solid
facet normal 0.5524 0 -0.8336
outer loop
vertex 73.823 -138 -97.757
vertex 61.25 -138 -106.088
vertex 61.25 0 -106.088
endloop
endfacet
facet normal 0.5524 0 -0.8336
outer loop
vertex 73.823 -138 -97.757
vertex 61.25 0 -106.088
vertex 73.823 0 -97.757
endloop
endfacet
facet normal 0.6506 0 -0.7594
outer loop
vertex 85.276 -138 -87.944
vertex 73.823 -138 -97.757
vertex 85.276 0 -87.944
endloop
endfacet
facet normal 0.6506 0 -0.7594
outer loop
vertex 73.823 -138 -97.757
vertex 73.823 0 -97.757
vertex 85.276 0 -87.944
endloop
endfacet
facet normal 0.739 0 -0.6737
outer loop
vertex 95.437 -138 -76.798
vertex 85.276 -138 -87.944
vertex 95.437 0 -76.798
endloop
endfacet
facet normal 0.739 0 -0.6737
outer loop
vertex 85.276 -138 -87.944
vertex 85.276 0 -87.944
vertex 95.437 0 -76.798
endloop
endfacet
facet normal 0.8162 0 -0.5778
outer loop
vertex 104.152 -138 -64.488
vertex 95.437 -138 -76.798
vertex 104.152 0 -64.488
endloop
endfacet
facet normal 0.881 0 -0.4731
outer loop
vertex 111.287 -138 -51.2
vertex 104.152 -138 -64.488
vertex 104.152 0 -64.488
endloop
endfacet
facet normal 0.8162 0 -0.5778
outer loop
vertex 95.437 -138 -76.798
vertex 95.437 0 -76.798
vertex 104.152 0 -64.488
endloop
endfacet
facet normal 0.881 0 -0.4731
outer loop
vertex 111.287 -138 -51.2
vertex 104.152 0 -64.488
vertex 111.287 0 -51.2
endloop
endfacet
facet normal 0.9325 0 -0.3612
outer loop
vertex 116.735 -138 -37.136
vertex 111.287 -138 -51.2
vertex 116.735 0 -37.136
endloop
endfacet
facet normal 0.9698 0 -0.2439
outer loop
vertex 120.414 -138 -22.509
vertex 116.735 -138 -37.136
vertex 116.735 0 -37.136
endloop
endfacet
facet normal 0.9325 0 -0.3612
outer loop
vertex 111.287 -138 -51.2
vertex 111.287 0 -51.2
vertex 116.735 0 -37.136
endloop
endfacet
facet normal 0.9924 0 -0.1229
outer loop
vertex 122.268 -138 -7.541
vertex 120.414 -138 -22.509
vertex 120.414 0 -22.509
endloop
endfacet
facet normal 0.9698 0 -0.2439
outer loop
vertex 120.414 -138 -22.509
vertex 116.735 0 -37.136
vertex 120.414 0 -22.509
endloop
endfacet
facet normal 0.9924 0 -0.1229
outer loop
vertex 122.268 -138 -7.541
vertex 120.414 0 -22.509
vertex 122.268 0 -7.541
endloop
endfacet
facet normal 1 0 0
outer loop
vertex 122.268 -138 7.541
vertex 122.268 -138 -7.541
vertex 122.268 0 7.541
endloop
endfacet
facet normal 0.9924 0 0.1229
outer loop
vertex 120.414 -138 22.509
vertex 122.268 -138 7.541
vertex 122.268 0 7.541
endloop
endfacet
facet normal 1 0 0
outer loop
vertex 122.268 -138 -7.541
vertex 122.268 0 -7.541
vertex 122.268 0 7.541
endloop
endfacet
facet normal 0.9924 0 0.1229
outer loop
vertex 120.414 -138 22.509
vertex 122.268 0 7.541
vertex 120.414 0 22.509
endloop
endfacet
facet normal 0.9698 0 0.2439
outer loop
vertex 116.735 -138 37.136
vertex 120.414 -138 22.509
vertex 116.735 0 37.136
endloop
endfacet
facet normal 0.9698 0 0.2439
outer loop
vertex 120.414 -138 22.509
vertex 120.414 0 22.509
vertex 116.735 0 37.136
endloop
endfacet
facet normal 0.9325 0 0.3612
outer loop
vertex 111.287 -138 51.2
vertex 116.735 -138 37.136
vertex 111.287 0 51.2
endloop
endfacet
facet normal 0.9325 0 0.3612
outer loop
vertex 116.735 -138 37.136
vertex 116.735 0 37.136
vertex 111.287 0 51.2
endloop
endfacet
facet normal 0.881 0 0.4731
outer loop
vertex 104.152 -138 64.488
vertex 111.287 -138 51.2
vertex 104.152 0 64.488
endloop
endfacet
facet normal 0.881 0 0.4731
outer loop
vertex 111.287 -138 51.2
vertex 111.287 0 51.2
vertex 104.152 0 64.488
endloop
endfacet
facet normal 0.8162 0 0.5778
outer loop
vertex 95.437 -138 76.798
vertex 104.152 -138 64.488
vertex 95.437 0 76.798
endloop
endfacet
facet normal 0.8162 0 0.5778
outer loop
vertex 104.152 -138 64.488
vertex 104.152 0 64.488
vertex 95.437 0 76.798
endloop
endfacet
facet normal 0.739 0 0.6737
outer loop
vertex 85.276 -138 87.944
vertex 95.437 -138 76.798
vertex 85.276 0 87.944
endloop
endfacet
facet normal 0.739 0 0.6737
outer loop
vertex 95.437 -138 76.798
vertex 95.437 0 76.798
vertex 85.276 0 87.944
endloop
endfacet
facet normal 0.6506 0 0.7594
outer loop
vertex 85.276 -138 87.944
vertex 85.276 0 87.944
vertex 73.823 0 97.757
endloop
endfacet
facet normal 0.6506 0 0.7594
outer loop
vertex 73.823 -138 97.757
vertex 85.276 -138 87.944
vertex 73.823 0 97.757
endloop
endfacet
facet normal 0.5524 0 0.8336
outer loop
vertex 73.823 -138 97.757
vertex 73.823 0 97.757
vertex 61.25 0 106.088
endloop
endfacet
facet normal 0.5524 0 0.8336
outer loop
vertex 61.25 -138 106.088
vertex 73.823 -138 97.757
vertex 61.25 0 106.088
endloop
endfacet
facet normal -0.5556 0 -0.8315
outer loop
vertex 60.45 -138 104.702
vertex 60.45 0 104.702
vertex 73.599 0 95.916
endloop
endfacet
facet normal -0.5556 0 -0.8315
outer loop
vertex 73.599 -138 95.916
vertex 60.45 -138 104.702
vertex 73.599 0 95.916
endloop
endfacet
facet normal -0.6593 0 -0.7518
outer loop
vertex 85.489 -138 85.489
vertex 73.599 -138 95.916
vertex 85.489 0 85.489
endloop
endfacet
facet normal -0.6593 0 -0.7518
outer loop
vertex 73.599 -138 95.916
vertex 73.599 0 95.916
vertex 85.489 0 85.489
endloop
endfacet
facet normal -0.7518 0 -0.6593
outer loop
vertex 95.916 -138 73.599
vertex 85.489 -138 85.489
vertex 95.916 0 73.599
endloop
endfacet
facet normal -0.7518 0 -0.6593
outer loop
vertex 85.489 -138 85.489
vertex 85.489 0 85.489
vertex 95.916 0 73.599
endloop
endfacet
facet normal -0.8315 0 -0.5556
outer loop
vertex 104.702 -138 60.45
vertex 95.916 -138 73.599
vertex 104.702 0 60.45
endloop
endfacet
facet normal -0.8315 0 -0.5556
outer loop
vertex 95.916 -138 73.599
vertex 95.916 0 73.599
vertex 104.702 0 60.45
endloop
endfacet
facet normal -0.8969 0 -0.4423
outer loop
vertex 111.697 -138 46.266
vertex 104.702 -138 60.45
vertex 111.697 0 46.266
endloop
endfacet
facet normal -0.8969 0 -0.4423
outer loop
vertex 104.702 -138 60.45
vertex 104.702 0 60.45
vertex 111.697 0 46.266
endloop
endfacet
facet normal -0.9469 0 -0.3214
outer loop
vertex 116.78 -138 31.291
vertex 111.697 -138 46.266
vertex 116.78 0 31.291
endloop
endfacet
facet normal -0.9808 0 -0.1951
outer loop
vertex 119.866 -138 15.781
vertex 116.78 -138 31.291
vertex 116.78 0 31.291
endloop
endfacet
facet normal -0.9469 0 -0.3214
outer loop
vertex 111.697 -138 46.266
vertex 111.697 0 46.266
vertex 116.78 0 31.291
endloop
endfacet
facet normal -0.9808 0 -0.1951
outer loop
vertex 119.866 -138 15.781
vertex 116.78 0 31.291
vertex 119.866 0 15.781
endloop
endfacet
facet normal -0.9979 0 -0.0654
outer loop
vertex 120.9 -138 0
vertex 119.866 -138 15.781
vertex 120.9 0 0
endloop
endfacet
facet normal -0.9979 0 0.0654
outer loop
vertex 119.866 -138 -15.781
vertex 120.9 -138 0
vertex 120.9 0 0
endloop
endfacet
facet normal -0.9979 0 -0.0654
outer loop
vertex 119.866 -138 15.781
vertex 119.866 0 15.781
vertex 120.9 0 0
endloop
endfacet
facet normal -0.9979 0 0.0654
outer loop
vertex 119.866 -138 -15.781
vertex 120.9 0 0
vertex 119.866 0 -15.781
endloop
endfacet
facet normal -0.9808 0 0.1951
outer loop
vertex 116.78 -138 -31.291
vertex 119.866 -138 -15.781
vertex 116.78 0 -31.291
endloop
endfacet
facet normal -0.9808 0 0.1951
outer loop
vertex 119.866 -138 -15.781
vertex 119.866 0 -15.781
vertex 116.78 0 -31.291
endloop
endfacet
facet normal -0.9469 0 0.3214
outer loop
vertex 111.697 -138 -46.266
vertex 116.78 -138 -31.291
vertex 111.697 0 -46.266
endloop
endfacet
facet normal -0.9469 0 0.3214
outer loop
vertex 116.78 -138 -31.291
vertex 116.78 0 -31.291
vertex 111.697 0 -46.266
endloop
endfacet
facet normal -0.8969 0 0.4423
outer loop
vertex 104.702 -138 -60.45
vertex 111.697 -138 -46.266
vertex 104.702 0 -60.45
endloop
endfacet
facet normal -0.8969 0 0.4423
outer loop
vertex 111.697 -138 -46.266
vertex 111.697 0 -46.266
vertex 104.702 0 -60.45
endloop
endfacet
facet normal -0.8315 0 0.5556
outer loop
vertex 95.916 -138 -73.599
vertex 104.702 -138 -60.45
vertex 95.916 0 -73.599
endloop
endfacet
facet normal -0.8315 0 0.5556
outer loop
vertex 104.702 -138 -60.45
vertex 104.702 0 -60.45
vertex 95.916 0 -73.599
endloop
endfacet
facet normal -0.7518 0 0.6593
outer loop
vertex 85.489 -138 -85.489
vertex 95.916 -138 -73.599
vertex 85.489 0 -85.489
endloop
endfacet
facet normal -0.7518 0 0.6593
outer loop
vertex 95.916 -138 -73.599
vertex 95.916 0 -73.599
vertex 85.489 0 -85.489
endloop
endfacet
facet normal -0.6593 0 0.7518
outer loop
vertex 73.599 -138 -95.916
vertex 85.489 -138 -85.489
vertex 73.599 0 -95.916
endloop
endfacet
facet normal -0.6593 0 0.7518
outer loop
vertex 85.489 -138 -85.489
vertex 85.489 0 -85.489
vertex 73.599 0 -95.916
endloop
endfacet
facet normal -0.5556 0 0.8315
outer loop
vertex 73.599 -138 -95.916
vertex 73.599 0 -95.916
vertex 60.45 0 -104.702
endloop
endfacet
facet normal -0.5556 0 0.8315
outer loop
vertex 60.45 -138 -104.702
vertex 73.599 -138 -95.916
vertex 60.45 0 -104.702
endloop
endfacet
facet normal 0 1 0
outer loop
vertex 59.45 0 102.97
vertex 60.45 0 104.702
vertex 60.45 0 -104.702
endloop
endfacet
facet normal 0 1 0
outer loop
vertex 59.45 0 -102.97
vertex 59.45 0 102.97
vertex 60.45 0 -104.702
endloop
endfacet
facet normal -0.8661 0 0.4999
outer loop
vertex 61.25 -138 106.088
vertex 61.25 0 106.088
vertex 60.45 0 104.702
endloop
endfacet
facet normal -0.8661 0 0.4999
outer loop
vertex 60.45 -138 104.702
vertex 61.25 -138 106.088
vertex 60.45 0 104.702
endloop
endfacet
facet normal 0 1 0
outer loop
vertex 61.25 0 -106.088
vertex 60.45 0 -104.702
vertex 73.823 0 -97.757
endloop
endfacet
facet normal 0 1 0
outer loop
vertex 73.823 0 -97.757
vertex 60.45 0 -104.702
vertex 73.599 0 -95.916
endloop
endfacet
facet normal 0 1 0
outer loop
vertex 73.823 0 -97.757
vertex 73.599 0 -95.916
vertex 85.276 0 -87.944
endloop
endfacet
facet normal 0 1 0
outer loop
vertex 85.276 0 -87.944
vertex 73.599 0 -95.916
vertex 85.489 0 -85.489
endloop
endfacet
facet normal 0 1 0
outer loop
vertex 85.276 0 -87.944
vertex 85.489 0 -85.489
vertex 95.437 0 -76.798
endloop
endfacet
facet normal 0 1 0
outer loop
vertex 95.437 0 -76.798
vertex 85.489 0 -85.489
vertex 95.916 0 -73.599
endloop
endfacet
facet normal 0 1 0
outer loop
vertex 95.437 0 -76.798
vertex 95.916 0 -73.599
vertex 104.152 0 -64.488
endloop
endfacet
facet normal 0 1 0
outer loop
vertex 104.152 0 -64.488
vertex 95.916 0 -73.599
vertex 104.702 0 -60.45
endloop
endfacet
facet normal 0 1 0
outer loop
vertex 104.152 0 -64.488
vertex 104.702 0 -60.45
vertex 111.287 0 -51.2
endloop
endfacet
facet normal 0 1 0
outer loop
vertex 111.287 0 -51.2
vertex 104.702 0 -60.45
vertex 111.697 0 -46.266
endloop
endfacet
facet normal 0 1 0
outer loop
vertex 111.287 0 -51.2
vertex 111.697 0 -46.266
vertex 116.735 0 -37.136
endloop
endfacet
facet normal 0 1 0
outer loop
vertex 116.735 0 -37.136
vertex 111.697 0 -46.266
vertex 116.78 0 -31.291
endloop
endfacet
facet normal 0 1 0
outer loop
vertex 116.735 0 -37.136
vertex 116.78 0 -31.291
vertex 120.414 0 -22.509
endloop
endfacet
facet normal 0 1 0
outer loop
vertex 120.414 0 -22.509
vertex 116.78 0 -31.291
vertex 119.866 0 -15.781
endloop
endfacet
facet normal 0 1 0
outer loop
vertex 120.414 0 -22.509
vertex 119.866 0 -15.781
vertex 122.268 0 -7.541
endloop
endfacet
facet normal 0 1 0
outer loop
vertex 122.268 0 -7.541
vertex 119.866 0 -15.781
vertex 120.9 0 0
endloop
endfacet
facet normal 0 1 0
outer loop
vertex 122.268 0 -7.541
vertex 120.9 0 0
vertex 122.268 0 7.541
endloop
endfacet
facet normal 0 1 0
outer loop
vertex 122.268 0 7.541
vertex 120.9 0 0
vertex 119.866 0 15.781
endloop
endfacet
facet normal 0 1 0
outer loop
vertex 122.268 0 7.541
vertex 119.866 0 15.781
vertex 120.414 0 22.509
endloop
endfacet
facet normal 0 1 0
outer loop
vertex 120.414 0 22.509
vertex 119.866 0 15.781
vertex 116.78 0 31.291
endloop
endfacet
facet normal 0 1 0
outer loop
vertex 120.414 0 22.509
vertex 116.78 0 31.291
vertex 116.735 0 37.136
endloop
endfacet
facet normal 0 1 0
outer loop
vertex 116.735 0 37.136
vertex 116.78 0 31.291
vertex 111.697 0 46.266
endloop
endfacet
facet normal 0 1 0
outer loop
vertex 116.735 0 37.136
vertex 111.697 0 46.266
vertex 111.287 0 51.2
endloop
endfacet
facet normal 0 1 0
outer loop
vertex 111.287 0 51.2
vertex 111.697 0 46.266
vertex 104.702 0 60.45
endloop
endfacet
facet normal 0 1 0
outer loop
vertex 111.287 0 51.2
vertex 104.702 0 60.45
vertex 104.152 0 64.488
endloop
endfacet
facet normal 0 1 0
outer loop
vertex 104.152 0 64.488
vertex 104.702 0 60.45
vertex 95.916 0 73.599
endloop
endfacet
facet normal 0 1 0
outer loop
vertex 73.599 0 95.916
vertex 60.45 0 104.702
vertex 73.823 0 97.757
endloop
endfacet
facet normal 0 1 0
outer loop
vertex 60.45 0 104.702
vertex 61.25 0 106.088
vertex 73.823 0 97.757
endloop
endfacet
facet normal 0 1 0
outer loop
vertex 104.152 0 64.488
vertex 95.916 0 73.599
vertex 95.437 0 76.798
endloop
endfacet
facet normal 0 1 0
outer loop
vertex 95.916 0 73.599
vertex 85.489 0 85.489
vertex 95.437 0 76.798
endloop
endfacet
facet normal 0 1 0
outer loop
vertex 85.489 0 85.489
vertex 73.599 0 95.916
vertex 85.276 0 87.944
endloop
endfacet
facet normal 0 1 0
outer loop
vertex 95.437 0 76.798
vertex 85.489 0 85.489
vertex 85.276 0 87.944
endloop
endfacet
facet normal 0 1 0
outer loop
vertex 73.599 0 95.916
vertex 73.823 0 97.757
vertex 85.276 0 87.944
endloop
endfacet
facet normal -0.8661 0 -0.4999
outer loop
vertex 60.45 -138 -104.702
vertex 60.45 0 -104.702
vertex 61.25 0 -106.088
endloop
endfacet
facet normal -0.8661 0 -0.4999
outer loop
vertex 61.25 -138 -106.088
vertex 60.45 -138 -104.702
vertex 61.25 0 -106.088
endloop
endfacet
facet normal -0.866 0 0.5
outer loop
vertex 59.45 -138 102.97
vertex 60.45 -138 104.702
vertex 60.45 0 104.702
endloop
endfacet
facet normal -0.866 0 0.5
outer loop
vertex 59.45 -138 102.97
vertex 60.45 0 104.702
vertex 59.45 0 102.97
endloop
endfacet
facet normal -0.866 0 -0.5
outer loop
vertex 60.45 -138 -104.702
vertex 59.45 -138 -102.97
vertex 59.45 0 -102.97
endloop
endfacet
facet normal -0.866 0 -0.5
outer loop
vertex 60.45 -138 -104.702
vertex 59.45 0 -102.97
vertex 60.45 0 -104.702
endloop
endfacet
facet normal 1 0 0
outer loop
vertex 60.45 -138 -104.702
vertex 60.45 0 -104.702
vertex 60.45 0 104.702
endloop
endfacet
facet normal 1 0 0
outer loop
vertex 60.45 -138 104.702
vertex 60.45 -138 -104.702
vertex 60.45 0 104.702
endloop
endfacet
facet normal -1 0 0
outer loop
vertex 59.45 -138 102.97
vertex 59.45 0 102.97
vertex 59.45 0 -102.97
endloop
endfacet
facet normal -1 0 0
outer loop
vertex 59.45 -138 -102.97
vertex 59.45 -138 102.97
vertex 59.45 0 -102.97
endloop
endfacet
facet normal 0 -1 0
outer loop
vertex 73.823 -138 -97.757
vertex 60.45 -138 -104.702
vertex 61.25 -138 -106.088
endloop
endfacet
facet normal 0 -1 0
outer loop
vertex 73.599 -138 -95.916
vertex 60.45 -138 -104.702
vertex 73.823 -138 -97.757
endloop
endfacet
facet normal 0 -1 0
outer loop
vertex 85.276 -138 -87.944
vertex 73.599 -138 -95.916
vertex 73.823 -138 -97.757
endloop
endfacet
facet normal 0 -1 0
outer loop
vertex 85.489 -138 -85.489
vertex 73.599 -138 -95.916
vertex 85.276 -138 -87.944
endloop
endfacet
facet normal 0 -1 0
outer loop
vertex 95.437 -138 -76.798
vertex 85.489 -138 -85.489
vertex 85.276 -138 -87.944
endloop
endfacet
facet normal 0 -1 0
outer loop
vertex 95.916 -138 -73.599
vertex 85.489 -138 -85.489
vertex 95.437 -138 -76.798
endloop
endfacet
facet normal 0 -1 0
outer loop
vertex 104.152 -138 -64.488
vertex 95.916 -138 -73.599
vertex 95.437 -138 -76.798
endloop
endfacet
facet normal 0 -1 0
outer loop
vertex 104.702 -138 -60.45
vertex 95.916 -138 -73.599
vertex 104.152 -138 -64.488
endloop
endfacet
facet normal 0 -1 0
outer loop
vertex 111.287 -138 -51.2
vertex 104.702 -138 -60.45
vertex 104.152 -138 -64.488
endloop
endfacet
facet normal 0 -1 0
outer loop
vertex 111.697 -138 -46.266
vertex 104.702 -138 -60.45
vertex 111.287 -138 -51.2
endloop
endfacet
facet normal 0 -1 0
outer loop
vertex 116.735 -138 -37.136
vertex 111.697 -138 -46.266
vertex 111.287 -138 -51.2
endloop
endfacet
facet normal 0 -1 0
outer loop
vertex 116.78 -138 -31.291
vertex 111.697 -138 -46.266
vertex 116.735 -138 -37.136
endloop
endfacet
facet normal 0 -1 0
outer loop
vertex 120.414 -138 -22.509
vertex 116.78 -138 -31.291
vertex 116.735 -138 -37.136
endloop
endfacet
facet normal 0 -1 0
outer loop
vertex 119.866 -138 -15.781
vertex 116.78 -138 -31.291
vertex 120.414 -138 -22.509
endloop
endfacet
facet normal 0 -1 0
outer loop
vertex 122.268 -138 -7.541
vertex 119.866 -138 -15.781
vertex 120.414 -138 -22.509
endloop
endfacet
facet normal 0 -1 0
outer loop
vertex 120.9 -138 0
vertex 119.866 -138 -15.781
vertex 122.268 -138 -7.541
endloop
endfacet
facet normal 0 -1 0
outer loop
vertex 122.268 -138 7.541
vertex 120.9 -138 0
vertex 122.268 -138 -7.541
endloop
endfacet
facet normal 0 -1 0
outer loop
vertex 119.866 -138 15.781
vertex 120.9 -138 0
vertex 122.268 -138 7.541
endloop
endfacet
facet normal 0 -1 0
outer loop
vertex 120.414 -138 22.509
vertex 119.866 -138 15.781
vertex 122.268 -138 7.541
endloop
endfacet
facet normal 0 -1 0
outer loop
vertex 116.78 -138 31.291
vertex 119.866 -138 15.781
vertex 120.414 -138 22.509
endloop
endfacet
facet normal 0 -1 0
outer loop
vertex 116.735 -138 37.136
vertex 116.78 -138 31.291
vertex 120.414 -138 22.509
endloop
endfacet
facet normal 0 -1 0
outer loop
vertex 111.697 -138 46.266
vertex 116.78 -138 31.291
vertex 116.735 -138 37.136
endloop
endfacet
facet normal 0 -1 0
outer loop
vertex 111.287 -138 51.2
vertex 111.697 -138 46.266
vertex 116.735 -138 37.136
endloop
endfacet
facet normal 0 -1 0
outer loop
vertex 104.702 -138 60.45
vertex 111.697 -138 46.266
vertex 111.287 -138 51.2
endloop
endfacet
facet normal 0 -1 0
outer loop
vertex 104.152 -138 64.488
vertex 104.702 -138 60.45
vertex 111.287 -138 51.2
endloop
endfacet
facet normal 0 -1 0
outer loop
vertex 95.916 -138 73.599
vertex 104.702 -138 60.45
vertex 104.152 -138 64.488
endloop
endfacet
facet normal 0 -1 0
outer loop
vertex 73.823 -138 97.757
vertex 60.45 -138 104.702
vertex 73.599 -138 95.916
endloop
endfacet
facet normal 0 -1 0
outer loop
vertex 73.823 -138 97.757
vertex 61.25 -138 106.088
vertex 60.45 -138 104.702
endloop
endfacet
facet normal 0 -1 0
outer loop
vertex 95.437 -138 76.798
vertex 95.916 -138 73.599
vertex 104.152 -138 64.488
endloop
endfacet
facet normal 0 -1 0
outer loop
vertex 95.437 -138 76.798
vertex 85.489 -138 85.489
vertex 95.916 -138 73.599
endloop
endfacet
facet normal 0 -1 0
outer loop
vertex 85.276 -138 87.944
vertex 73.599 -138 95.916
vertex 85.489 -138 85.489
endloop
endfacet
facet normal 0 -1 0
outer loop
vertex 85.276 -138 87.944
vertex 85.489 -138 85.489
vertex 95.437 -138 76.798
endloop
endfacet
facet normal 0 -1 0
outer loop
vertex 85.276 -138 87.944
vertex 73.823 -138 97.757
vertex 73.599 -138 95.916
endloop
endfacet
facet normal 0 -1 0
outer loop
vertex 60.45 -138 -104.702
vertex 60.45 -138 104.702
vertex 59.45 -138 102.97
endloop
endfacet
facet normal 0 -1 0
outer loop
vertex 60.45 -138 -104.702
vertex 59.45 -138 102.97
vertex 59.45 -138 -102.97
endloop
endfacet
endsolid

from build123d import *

# Parameters (mm, degrees)
F1_DEPTH = 138


with BuildPart() as f1:
    # F0 (on Front) → F1 (new body)
    with BuildSketch(Plane.XZ):
        with BuildLine():
            ThreePointArc((60.45, 104.702471), (120.9, 0), (60.45, -104.702471))
            Line((60.45, -104.702471), (61.25, -106.088112))
            ThreePointArc((61.25, -106.088112), (122.5, 0), (61.25, 106.088112))
            Line((61.25, 106.088112), (60.45, 104.702471))
        make_face()
        Polygon((59.45, -102.970421), (60.45, -104.702471), (60.45, 104.702471), (59.45, 102.970421), align=None)
    extrude(amount=F1_DEPTH)


solid = f1.part
